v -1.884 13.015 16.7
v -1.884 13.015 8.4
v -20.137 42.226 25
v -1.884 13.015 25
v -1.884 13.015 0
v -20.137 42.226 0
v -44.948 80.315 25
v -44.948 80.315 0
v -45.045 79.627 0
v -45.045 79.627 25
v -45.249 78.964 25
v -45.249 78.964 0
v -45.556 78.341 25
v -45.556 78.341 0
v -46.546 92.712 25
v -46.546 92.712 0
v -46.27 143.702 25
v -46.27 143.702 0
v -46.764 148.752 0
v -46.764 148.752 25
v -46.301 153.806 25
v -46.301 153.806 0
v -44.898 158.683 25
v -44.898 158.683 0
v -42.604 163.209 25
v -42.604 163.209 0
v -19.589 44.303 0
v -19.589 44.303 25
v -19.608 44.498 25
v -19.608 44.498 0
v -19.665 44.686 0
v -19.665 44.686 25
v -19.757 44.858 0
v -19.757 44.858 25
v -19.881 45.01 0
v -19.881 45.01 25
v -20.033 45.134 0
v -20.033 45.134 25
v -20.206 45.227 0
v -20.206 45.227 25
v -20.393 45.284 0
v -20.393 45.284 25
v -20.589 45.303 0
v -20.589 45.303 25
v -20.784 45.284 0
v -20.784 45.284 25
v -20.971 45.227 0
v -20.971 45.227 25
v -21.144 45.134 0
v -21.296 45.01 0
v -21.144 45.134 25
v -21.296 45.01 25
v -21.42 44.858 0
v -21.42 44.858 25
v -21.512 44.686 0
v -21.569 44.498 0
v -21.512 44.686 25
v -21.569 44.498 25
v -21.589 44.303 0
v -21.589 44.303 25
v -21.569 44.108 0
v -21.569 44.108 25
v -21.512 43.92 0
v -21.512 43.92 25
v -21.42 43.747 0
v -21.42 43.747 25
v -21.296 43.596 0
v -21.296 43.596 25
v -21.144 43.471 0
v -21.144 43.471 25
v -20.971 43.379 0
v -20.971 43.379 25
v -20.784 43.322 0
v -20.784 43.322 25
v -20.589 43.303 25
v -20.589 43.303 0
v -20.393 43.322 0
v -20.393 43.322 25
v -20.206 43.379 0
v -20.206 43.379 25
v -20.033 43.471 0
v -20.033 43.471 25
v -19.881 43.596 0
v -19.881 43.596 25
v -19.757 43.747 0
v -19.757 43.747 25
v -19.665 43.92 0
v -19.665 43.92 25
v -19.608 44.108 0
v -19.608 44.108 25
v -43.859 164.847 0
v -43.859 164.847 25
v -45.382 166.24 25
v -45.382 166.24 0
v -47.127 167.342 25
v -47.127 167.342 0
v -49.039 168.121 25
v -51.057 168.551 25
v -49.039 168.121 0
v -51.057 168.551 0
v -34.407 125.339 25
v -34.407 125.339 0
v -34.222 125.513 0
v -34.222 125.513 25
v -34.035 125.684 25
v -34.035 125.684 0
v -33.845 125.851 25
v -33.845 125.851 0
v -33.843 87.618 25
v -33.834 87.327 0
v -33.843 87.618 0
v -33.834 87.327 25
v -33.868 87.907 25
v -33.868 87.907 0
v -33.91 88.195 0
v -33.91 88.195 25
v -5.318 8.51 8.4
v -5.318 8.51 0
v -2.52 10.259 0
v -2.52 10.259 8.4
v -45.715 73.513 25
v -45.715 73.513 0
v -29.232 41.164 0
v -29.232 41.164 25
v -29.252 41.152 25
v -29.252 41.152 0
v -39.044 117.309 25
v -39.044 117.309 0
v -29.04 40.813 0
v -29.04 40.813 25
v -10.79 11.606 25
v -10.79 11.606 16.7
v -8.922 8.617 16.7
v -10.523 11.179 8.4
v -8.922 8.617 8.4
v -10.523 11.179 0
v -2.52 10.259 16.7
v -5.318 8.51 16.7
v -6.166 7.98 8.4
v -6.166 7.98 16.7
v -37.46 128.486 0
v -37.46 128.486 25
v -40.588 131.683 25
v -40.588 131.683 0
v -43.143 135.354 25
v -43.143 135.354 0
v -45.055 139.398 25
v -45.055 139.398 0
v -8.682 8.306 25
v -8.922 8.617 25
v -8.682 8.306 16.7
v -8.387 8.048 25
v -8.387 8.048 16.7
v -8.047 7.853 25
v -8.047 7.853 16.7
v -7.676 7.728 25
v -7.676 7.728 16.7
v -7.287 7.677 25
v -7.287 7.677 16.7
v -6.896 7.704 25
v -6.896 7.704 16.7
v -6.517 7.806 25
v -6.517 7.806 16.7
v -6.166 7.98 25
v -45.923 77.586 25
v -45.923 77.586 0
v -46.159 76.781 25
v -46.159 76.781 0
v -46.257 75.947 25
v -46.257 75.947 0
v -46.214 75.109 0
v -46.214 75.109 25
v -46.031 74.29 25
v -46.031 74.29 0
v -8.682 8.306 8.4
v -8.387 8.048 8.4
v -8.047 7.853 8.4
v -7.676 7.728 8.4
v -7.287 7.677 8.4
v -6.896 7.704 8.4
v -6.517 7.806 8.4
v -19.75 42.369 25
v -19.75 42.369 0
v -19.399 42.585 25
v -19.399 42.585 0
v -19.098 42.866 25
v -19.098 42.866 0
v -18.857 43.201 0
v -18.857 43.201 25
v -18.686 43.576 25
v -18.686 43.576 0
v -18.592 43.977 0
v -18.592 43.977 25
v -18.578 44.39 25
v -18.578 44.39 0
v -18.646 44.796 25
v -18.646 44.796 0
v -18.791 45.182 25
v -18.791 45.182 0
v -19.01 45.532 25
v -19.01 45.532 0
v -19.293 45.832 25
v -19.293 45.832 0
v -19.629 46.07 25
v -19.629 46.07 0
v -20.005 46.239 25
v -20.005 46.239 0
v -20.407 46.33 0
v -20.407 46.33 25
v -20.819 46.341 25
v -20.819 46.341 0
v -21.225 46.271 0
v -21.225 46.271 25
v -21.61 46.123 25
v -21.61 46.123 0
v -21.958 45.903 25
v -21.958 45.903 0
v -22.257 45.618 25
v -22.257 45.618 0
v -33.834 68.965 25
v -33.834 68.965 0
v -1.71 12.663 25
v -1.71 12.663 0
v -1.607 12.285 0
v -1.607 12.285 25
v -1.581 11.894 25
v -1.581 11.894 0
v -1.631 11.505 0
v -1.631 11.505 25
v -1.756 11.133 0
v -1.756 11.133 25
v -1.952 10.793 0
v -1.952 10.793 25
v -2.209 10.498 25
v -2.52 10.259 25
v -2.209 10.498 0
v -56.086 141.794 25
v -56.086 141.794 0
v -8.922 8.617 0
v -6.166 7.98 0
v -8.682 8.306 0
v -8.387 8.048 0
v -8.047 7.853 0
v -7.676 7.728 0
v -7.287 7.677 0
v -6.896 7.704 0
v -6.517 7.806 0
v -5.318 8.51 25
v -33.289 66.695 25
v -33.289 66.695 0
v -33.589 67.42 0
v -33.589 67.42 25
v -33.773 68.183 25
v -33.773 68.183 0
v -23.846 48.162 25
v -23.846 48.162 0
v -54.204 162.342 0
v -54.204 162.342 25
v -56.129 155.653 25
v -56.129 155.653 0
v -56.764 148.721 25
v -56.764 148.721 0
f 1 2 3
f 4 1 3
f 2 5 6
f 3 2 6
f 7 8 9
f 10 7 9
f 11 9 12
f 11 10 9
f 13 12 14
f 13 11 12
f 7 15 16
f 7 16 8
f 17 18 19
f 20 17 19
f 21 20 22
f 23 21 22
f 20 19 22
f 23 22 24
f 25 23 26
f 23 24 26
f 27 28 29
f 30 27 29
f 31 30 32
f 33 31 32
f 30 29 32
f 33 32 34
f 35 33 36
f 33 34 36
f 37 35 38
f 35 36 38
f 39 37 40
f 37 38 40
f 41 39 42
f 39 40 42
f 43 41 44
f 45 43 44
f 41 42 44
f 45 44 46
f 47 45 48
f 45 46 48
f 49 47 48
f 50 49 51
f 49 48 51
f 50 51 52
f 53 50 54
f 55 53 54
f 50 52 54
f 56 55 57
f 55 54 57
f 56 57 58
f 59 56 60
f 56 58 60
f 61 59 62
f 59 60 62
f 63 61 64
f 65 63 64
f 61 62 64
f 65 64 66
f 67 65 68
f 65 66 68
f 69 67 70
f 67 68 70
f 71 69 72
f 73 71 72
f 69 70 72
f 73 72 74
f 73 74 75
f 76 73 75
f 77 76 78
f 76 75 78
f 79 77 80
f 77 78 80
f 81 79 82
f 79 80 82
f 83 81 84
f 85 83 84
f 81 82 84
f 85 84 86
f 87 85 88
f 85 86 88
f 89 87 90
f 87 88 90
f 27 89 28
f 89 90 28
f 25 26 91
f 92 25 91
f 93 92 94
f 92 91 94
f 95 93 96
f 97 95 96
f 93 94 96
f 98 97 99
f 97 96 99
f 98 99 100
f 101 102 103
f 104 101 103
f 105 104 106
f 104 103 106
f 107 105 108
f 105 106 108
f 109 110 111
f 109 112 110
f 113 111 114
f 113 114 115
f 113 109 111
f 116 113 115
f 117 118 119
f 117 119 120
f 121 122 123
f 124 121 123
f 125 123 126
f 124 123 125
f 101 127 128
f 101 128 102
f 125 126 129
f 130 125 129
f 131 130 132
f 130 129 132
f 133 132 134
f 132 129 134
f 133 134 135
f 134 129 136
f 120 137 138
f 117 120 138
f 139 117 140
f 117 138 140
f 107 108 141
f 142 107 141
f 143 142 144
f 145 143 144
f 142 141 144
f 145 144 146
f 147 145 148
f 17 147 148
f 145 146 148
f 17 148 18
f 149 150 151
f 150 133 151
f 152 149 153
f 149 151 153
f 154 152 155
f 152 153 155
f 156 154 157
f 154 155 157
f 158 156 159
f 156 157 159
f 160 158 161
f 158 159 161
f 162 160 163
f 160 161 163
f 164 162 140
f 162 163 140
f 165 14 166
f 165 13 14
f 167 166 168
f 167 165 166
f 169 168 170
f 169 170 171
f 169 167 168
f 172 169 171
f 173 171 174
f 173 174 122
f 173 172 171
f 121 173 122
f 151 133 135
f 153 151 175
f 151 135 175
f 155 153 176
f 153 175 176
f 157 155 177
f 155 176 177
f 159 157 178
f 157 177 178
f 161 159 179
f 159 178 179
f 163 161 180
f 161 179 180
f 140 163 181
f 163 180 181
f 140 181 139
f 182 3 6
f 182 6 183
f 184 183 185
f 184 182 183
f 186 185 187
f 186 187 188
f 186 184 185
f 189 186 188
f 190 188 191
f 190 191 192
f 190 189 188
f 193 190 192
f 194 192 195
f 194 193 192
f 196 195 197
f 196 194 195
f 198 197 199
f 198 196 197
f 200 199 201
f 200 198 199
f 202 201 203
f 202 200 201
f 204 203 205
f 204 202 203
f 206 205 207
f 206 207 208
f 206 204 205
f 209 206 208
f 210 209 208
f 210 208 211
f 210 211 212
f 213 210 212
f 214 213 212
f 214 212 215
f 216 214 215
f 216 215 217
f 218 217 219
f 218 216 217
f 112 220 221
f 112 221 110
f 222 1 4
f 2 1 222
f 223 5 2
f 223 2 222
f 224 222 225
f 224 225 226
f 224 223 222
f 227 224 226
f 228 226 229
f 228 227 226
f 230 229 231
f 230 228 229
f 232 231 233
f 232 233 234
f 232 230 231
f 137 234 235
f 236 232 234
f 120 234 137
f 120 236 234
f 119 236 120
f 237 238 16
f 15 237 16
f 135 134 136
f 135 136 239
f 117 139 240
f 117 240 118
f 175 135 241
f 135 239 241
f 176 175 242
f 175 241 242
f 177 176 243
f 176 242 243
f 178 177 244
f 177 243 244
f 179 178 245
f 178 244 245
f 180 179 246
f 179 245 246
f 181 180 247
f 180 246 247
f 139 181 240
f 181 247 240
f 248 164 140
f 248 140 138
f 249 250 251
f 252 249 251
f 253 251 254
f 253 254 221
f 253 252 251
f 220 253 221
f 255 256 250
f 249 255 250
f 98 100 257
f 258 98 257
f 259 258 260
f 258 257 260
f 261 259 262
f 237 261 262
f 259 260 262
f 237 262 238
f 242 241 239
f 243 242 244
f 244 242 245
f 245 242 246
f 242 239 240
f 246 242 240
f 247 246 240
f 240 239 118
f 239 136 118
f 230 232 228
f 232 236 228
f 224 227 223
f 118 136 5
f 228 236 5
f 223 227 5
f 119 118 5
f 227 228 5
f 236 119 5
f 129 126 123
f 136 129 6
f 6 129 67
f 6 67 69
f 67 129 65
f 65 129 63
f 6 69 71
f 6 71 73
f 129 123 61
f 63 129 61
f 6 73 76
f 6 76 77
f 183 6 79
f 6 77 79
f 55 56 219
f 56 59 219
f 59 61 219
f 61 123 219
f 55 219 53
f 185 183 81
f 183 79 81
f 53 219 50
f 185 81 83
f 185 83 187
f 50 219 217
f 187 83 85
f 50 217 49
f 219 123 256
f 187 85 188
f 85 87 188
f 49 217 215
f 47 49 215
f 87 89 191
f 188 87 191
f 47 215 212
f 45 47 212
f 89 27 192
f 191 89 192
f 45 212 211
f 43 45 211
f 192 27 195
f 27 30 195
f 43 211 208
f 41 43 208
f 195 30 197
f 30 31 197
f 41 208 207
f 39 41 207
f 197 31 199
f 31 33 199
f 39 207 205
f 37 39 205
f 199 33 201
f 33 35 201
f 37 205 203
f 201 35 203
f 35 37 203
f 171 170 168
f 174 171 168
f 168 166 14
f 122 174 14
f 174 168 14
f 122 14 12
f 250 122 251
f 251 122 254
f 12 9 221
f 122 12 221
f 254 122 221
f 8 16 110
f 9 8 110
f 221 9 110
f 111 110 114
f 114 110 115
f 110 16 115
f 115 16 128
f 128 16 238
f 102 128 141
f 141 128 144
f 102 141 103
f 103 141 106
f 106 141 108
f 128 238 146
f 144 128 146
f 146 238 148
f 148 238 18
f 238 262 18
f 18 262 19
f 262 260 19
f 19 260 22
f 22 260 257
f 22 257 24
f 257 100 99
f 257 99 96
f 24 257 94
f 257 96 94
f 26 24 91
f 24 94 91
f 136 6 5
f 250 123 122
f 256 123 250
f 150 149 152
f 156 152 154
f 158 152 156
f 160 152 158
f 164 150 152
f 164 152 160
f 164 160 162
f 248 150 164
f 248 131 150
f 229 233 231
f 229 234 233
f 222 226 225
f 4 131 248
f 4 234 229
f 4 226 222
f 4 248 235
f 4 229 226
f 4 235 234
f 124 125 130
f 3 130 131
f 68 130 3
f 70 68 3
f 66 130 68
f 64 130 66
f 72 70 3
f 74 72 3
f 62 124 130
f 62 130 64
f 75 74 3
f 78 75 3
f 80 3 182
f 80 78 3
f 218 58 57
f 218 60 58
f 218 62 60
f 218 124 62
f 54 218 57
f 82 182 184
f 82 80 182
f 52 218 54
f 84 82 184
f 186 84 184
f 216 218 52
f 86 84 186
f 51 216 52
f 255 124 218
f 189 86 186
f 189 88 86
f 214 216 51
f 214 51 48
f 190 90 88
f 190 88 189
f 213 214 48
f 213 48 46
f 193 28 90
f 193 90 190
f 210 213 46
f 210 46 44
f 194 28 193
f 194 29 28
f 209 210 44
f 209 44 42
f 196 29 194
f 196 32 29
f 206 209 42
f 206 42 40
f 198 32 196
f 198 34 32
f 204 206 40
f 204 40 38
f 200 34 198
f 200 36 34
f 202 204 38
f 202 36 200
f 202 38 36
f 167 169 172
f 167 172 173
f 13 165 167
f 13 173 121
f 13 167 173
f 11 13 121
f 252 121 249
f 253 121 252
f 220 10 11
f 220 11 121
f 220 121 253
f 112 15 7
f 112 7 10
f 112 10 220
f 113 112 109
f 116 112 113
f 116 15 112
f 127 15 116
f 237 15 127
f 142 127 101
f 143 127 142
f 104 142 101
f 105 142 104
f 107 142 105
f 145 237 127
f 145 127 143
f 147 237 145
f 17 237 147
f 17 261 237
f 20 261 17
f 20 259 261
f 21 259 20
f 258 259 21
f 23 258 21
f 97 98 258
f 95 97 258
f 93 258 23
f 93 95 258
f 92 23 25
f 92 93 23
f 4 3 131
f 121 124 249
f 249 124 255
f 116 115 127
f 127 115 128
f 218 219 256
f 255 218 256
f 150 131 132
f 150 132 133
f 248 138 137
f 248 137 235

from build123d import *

# Parameters (mm, degrees)
F1_DEPTH  = 25
F2_DEPTH  = 25
F3_R      = 10.0351609687
F4_DEPTH  = 25
F5_W      = 5.021744368
F5_H      = 8.4
F5_W_2    = 5.524914672
F5_H_2    = 8.3
F6_DEPTH  = 28.7
F7_DEPTH  = 31.3
F8_W      = 20.0703219374
F8_H      = 8.3
F8_H_2    = 8.4
F9_DEPTH  = 25
F10_D     = 15
F11_DEPTH = 3
F12_DEPTH = 3
F13_DEPTH = 0.4
F15_DEPTH = 25
F16_R     = 5
F17_R     = 5
F18_R     = 5
F20_DEPTH = 25
F21_R     = 1
F22_DEPTH = 25
F24_DEPTH = 25
F25_R     = 2


with BuildPart() as f1:
    # F0 (on Top) → F1 (new body)
    with BuildSketch(Plane.XY):
        with BuildLine():
            Line((-46.5458918775, 92.7124905365), (-33.8341578848, 67.7643078592))
            Line((-33.8341578848, 67.7643078592), (-33.8341578848, 87.7643078592))
            Line((-33.8341578848, 87.7643078592), (-39.0436032148, 117.3085404495))
            ThreePointArc((-39.0436032148, 117.3085404495), (-50.1493049738, 127.7523979683), (-56.0863416463, 141.7938497088))
            Line((-56.0863416463, 141.7938497088), (-46.5458918775, 92.7124905365))
        make_face()
        Polygon((-26.4959632117, 42.4024048078), (0, 0), (0, 10), (-23.8463668905, 48.162164327), (-33.8341578848, 67.7643078592), (-46.5458918775, 92.7124905365), (-44.6555832012, 78.0426657754), align=None)
    extrude(amount=F1_DEPTH)

    # F0 (on Top) → F2 (join)
    with BuildSketch(Plane.XY):
        Polygon((-26.4959632117, 42.4024048078), (0, 0), (0, 10), (-23.8463668905, 48.162164327), (-33.8341578848, 67.7643078592), (-46.5458918775, 92.7124905365), (-44.6555832012, 78.0426657754), align=None)
        with BuildLine():
            Line((-46.5458918775, 92.7124905365), (-33.8341578848, 67.7643078592))
            Line((-33.8341578848, 67.7643078592), (-33.8341578848, 87.7643078592))
            Line((-33.8341578848, 87.7643078592), (-39.0436032148, 117.3085404495))
            ThreePointArc((-39.0436032148, 117.3085404495), (-50.1493049738, 127.7523979683), (-56.0863416463, 141.7938497088))
            Line((-56.0863416463, 141.7938497088), (-46.5458918775, 92.7124905365))
        make_face()
        with BuildLine():
            ThreePointArc((-51.0571508097, 168.5508889923), (-56.1292788842, 155.6530772369), (-56.0863416463, 141.7938497088))
            ThreePointArc((-56.0863416463, 141.7938497088), (-50.1493049738, 127.7523979683), (-39.0436032148, 117.3085404495))
            ThreePointArc((-39.0436032148, 117.3085404495), (-37.3018340244, 121.656861024), (-34.4069625383, 125.3394376776))
            ThreePointArc((-34.4069625383, 125.3394376776), (-34.1290622054, 125.5985630521), (-33.8452613454, 125.8512122687))
            ThreePointArc((-33.8452613454, 125.8512122687), (-46.0977457681, 142.6841841118), (-42.6035759811, 163.2088788258))
            ThreePointArc((-42.6035759811, 163.2088788258), (-46.2302574516, 166.8295340113), (-51.0571508097, 168.5508889923))
        make_face()
        with BuildLine():
            ThreePointArc((-34.4069625383, 125.3394376776), (-37.3018340244, 121.656861024), (-39.0436032148, 117.3085404495))
            Line((-39.0436032148, 117.3085404495), (-34.4069625383, 125.3394376776))
        make_face()
        with BuildLine():
            ThreePointArc((-46.2700698118, 143.7019396626), (-46.3013690244, 153.8058664235), (-42.6035759811, 163.2088788258))
            ThreePointArc((-42.6035759811, 163.2088788258), (-46.0977457681, 142.6841841118), (-33.8452613454, 125.8512122687))
            ThreePointArc((-33.8452613454, 125.8512122687), (-41.9417428936, 133.4651840398), (-46.2700698118, 143.7019396626))
        make_face()
    extrude(amount=F2_DEPTH)

    # F3 (on Top) → F4 (join)
    with BuildSketch(Plane.XY):
        Circle(F3_R)
    extrude(amount=F4_DEPTH)

    # F5 (on face) → F6 (join)
    with BuildSketch(Plane(origin=(0, 0, 0), x_dir=(0.5299192642, -0.8480480962, 0), z_dir=(-0.8480480962, -0.5299192642, 0))):
        with Locations((-12.5460331527, 4.2)):
            Rectangle(F5_W, F5_H)
        with Locations((-12.7976183047, 20.85)):
            Rectangle(F5_W_2, F5_H_2)
    extrude(amount=F6_DEPTH)

    # F7 (cut, symmetric): faces of the model
    f7_faces = [f1.faces().sort_by_distance(p)[0] for p in [
        (-17.4873152969, 0.9059577124, 20.85),
        (-17.4873152969, 0.9059577124, 4.2),
    ]]
    extrude(f7_faces, amount=F7_DEPTH, both=True, mode=Mode.SUBTRACT)

    # F8 (on face) → F9 (cut)
    with BuildSketch(Plane(origin=(0, 0, 0), x_dir=(0.5299192642, -0.8480480962, 0), z_dir=(-0.8480480962, -0.5299192642, 0))):
        with Locations((0, 20.85)):
            Rectangle(F8_W, F8_H)
        with Locations((0, 4.2)):
            Rectangle(F8_W, F8_H_2)
    extrude(amount=-F9_DEPTH, mode=Mode.SUBTRACT)

    # F10 (through all)
    with Locations(Plane(origin=(0, 0, 0), x_dir=(1, 0, 0), z_dir=(0, 0, -1))):
        with Locations((0, 0)):
            Hole(F10_D / 2)

    # F11 (add): a face of the model
    f11_faces = [f1.faces().sort_by_distance(p)[0] for p in [
        (-15.9068941643, 25.456351981, 12.5),
    ]]
    extrude(f11_faces, amount=F11_DEPTH)

    # F12 (add): a face of the model
    f12_faces = [f1.faces().sort_by_distance(p)[0] for p in [
        (-35.5757732065, 60.2225352916, 12.5),
    ]]
    extrude(f12_faces, amount=F12_DEPTH)

    # F13 (add): a face of the model
    f13_faces = [f1.faces().sort_by_distance(p)[0] for p in [
        (-27.7680353559, 41.6075259115, 12.5),
    ]]
    extrude(f13_faces, amount=F13_DEPTH)

    # F14 (on face) → F15 (join)
    with BuildSketch(Plane.XY.offset(25)):
        with BuildLine():
            ThreePointArc((-44.9484246095, 80.3152745808), (-45.6553028657, 78.1815440804), (-47.3286027738, 76.6806942761))
            Line((-47.3286027738, 76.6806942761), (-44.6555832012, 78.0426657754))
            Line((-44.6555832012, 78.0426657754), (-44.9484246095, 80.3152745808))
        make_face()
        with BuildLine():
            Line((-44.6555832012, 78.0426657754), (-47.3286027738, 76.6806942761))
            Line((-47.3286027738, 76.6806942761), (-29.2321155859, 41.1643384084))
            Line((-29.2321155859, 41.1643384084), (-29.2520752058, 41.1518662536))
            Line((-29.2520752058, 41.1518662536), (-7.8619694055, 6.9205413615))
            Line((-7.8619694055, 6.9205413615), (-0.8238548855, 11.3184434202))
            Line((-0.8238548855, 11.3184434202), (-23.8463668905, 48.162164327))
            Line((-23.8463668905, 48.162164327), (-33.8341578848, 67.7643078592))
            Line((-33.8341578848, 67.7643078592), (-33.8341578848, 87.7643078592))
            Line((-33.8341578848, 87.7643078592), (-39.0436032148, 117.3085404495))
            Line((-39.0436032148, 117.3085404495), (-34.4069625383, 125.3394376776))
            ThreePointArc((-34.4069625383, 125.3394376776), (-34.1290622054, 125.5985630521), (-33.8452613454, 125.8512122687))
            ThreePointArc((-33.8452613454, 125.8512122687), (-46.0541257293, 142.6944106077), (-42.6035759811, 163.2088788258))
            ThreePointArc((-42.6035759811, 163.2088788258), (-46.2302574516, 166.8295340113), (-51.0571508097, 168.5508889923))
            ThreePointArc((-51.0571508097, 168.5508889923), (-56.1292788842, 155.6530772369), (-56.0863416463, 141.7938497088))
            Line((-56.0863416463, 141.7938497088), (-46.5458918775, 92.7124905365))
            Line((-46.5458918775, 92.7124905365), (-45.1575485807, 81.9381904826))
            ThreePointArc((-45.1575485807, 81.9381904826), (-44.9764120983, 81.1365996867), (-44.9484246095, 80.3152745808))
            Line((-44.9484246095, 80.3152745808), (-44.6555832012, 78.0426657754))
        make_face()
    extrude(amount=-F15_DEPTH)

    # F16
    f16_edges = [f1.edges().sort_by_distance(p)[0] for p in [
        (-47.328603, 76.680694, 12.5),
    ]]
    fillet(f16_edges, radius=F16_R)

    # F17
    f17_edges = [f1.edges().sort_by_distance(p)[0] for p in [
        (-33.834158, 67.764308, 12.5),
    ]]
    fillet(f17_edges, radius=F17_R)

    # F18
    f18_edges = [f1.edges().sort_by_distance(p)[0] for p in [
        (-33.834158, 87.764308, 12.5),
    ]]
    fillet(f18_edges, radius=F18_R)

    # F19 (on face) → F20 (join)
    with BuildSketch(Plane.XY.offset(25)):
        with BuildLine():
            Line((-22.2566090978, 45.6180200386), (-20.1369320409, 42.2258276539))
            ThreePointArc((-20.1369320409, 42.2258276539), (-18.8920264045, 45.3620878389), (-22.2566090978, 45.6180200386))
        make_face()
    extrude(amount=-F20_DEPTH)

    # F21 (on face) → F22 (cut)
    with BuildSketch(Plane.XY.offset(25)):
        with Locations((-20.5885408694, 44.3029189806)):
            Circle(F21_R)
    extrude(amount=-F22_DEPTH, mode=Mode.SUBTRACT)

    # F23 (on face) → F24 (cut)
    with BuildSketch(Plane.XY.offset(16.7)):
        Polygon((-21.581498906, -1.6523721461), (-21.581498906, -2.9845223762), (2.6676976122, -15.5032956973), (23.1070481241, 1.1343396036), (-0.8238548855, 11.3184434202), align=None)
    extrude(amount=-F24_DEPTH, mode=Mode.SUBTRACT)

    # F25
    f25_edges = [f1.edges().sort_by_distance(p)[0] for p in [
        (-0.823855, 11.318443, 12.5),
        (-7.861969, 6.920541, 12.5),
    ]]
    fillet(f25_edges, radius=F25_R)


solid = f1.part
